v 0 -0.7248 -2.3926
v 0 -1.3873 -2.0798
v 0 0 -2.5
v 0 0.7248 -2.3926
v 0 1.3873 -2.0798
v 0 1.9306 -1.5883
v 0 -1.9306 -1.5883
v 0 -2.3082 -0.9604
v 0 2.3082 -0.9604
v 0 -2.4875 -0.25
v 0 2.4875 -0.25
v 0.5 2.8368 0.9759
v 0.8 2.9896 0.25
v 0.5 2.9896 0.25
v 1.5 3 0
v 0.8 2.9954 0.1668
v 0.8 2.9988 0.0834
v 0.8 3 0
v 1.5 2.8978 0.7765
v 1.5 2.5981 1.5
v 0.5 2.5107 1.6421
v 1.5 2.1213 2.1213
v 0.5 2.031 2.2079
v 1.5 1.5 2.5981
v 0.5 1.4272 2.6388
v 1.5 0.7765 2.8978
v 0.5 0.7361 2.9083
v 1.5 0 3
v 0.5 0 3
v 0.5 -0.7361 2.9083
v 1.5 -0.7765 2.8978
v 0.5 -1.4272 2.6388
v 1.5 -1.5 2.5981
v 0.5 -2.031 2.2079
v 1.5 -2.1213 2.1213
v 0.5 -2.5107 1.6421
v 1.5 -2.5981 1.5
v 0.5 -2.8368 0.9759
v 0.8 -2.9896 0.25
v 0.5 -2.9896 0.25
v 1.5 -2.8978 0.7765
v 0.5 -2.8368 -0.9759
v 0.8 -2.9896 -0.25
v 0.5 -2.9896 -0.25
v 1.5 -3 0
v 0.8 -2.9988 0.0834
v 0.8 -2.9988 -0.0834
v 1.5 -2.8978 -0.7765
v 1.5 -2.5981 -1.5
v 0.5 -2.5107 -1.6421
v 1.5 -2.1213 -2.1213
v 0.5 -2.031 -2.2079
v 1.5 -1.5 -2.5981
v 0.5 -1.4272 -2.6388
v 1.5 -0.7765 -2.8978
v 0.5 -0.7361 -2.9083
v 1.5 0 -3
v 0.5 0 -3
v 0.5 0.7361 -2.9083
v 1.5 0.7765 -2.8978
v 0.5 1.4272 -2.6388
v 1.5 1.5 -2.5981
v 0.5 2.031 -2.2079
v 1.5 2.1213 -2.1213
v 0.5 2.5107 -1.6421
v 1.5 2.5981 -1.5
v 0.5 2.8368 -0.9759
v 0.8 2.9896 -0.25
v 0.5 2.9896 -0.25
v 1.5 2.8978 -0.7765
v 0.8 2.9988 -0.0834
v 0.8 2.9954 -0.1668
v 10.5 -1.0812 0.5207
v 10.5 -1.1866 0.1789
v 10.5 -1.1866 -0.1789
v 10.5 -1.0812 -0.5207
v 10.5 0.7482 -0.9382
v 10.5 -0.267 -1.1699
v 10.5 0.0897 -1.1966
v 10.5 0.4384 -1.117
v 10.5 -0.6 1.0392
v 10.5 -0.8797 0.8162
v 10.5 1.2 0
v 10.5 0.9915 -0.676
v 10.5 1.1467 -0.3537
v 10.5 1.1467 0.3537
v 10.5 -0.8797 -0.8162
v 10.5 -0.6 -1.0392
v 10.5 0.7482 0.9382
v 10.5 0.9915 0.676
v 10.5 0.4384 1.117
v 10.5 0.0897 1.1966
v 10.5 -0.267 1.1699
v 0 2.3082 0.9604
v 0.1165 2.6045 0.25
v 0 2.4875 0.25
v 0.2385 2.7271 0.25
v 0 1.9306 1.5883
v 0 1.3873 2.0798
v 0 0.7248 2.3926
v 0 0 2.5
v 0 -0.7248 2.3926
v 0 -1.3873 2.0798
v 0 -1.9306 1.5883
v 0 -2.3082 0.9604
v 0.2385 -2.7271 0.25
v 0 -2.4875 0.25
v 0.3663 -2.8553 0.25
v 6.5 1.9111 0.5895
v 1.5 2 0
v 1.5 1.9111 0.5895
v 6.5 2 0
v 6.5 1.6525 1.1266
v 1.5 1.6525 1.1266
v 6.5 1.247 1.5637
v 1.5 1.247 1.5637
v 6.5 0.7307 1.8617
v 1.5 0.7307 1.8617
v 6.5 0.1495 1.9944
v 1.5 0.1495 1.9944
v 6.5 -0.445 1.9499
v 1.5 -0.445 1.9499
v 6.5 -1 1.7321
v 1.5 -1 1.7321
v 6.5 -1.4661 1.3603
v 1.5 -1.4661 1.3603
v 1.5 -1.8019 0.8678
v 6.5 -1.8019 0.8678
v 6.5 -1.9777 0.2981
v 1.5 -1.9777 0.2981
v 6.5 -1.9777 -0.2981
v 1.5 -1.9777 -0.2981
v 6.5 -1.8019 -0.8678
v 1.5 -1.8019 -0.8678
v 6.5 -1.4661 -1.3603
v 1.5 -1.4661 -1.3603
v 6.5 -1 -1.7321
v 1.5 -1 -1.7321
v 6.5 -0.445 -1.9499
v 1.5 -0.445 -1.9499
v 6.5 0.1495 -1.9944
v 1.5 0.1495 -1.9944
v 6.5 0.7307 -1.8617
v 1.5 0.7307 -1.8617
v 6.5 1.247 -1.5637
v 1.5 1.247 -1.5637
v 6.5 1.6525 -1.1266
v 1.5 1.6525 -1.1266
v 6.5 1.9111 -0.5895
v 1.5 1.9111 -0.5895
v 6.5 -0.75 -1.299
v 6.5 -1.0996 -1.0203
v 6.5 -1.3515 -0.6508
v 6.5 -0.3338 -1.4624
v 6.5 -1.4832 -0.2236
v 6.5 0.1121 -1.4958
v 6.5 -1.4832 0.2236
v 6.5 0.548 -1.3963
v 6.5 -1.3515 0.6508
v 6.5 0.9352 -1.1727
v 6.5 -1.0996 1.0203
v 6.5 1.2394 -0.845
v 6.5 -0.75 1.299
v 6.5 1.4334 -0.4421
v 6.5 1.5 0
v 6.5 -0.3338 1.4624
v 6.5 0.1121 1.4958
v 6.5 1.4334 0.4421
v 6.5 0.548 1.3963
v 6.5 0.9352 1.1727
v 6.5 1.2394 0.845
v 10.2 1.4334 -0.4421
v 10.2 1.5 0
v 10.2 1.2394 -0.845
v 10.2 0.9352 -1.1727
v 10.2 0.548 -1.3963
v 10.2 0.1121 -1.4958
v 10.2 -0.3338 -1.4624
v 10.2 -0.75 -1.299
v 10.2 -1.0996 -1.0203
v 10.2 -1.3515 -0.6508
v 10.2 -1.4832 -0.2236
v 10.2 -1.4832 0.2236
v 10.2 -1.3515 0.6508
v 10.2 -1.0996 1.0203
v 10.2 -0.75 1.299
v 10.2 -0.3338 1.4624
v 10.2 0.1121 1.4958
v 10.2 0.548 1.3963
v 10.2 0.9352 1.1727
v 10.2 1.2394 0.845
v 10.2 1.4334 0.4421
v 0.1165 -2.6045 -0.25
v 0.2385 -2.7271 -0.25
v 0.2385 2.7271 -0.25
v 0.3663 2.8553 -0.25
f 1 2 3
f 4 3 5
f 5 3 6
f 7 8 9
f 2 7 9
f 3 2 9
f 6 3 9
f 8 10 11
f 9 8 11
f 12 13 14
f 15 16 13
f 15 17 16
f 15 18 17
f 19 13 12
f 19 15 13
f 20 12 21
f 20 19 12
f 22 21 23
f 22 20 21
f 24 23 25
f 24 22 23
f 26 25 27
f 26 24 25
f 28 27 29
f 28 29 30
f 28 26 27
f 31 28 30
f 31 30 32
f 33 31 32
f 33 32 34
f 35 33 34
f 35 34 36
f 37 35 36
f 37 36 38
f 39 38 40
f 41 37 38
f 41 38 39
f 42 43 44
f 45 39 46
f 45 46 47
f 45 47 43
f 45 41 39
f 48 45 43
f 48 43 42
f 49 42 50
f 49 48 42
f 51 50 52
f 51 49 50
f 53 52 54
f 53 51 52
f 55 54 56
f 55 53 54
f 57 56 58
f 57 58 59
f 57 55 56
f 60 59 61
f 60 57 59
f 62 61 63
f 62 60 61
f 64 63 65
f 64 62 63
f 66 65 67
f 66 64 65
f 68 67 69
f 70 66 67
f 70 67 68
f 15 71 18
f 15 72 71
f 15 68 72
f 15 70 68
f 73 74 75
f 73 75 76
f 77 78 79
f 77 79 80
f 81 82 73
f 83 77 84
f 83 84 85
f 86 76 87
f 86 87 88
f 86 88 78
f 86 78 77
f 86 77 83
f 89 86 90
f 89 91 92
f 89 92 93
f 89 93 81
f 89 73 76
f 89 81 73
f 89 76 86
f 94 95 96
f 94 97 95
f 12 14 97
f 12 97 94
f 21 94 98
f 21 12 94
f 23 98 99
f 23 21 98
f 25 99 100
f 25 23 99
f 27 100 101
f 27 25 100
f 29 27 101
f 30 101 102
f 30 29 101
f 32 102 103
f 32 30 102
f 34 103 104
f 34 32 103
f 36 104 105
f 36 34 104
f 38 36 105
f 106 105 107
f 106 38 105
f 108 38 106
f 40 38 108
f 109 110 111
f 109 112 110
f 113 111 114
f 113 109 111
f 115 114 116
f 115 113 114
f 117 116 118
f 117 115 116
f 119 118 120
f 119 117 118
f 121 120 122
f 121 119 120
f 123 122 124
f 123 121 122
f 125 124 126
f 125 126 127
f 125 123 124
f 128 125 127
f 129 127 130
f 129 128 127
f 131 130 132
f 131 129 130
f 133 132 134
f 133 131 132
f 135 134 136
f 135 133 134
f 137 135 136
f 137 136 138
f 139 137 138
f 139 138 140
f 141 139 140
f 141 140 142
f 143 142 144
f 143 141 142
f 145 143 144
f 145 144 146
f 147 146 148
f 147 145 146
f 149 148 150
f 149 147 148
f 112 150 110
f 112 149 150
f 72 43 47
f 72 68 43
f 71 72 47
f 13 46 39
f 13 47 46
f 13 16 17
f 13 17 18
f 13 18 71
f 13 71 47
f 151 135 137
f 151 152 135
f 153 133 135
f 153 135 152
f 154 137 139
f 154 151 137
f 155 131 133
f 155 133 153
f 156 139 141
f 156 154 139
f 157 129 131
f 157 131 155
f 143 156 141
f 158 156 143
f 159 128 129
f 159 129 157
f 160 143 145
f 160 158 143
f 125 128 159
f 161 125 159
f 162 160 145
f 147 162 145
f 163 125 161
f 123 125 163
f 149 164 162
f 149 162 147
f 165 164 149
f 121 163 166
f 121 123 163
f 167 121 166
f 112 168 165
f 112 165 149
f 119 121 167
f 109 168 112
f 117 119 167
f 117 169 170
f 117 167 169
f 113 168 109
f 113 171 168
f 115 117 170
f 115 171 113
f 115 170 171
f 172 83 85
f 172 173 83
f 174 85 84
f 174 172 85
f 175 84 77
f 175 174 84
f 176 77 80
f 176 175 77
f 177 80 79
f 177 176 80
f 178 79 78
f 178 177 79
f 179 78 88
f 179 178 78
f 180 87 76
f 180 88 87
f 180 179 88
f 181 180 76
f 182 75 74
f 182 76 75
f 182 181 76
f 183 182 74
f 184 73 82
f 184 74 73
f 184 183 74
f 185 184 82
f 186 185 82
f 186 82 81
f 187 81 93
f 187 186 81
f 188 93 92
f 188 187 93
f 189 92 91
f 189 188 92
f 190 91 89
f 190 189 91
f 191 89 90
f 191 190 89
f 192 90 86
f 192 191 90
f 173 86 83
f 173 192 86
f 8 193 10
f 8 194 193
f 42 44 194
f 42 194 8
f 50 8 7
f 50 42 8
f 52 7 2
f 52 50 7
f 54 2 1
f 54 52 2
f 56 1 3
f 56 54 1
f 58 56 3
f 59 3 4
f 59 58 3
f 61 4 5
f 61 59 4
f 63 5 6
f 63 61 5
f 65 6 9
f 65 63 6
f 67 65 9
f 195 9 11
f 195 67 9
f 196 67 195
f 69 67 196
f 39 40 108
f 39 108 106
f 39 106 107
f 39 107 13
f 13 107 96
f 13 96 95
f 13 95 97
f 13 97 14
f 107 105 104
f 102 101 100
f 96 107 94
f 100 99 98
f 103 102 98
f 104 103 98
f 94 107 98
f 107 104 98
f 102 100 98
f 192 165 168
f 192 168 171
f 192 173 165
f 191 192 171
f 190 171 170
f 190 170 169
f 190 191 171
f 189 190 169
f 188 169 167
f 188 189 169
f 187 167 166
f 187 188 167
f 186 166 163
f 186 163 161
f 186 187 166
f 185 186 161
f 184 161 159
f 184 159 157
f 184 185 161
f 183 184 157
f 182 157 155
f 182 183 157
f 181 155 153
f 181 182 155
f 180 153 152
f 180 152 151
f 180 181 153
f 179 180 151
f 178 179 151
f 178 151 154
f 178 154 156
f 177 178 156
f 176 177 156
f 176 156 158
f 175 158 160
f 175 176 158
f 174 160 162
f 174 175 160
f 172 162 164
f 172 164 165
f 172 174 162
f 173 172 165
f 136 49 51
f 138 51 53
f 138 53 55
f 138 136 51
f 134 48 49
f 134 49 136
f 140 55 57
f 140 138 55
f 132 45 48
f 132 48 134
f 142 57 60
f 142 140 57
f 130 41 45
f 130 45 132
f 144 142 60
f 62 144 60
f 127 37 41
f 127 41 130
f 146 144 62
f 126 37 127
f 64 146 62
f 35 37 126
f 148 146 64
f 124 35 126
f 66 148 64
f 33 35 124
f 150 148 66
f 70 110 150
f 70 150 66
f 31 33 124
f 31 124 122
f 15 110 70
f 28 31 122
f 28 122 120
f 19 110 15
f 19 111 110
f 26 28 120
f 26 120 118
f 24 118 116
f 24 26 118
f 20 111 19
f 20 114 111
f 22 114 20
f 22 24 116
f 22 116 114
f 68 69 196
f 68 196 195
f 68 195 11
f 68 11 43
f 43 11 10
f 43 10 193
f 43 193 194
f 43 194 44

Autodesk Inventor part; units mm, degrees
ref_plane "YZ Plane" through (0, 0, 0) normal (1, 0, 0) x (0, 1, 0)
ref_plane "XZ Plane" through (0, 0, 0) normal (0, 1, 0) x (-1, 0, 0)
ref_plane "XY Plane" through (0, 0, 0) normal (0, 0, 1) x (1, 0, 0)
sketch "Skizze1" plane through (0, 0, 0) normal (0, 0, 1) x (1, 0, 0)
  line L0 (-2.1, 0) -> (12.6, 0) projected
  line L1 (0, -0.6) -> (0, 3.6) projected
  line L2 (0, 0) -> (0, 3)
  line L3 (0, 3) -> (1.5, 3)
  line L4 (1.5, 3) -> (1.5, 2)
  line L5 (1.5, 2) -> (6.5, 2)
  line L6 (6.5, 2) -> (6.5, 1.5)
  line L7 (6.5, 1.5) -> (10.5, 1.5)
  line L8 (10.5, 1.5) -> (10.5, 0)
  line L9 (10.5, 0) -> (0, 0)
  dimension "d0" = 6
  dimension "d1" = 4
  dimension "d2" = 3
  dimension "d3" = 10.5
  dimension "d4" = 4
  dimension "d5" = 9
revolve "Umdrehung1" add sketch "Skizze1" angle 360 about axis through (-10, 0, 0) along (1, 0, 0)
thread "Gewinde1" size "M3x0.5" class "6g" standard "ANSI Metric M Profile" full length
chamfer "Fase1" distance 0.3 angle 45 1 edges at (10.5, -1.5, 0)
chamfer "Fase2" distance 0.5 angle 45 1 edges at (0, -3, 0)
sketch "Skizze2" plane through (0, 0, 0) normal (-1, 0, 0) x (0, 0, 1)
  line L0 (0, -4.2) -> (0, 4.2) projected
  line L1 (-4.2, 0) -> (4.2, 0) projected
  circle A0 centre (0, 0) radius 3 projected
  circle A1 centre (0, 0) radius 3 projected
  line L2 (-0.25, 2.9896) -> (-0.25, -2.9896)
  line L3 (0.25, -2.9896) -> (0.25, 2.9896)
  arc A2 (-0.25, -2.9896) -> (0.25, -2.9896) centre (0, 0) ccw
  arc A3 (0.25, 2.9896) -> (-0.25, 2.9896) centre (0, 0) ccw
  dimension "d15" = 0.5
extrude "Extrusion1" cut sketch "Skizze2" against normal blind 0.8 contours A0 L2 L1 L0 | L0 L1 L3 A0 | L1 L2 A0 L0 | L0 A0 L3 L1
properties part number "Zapfen"
